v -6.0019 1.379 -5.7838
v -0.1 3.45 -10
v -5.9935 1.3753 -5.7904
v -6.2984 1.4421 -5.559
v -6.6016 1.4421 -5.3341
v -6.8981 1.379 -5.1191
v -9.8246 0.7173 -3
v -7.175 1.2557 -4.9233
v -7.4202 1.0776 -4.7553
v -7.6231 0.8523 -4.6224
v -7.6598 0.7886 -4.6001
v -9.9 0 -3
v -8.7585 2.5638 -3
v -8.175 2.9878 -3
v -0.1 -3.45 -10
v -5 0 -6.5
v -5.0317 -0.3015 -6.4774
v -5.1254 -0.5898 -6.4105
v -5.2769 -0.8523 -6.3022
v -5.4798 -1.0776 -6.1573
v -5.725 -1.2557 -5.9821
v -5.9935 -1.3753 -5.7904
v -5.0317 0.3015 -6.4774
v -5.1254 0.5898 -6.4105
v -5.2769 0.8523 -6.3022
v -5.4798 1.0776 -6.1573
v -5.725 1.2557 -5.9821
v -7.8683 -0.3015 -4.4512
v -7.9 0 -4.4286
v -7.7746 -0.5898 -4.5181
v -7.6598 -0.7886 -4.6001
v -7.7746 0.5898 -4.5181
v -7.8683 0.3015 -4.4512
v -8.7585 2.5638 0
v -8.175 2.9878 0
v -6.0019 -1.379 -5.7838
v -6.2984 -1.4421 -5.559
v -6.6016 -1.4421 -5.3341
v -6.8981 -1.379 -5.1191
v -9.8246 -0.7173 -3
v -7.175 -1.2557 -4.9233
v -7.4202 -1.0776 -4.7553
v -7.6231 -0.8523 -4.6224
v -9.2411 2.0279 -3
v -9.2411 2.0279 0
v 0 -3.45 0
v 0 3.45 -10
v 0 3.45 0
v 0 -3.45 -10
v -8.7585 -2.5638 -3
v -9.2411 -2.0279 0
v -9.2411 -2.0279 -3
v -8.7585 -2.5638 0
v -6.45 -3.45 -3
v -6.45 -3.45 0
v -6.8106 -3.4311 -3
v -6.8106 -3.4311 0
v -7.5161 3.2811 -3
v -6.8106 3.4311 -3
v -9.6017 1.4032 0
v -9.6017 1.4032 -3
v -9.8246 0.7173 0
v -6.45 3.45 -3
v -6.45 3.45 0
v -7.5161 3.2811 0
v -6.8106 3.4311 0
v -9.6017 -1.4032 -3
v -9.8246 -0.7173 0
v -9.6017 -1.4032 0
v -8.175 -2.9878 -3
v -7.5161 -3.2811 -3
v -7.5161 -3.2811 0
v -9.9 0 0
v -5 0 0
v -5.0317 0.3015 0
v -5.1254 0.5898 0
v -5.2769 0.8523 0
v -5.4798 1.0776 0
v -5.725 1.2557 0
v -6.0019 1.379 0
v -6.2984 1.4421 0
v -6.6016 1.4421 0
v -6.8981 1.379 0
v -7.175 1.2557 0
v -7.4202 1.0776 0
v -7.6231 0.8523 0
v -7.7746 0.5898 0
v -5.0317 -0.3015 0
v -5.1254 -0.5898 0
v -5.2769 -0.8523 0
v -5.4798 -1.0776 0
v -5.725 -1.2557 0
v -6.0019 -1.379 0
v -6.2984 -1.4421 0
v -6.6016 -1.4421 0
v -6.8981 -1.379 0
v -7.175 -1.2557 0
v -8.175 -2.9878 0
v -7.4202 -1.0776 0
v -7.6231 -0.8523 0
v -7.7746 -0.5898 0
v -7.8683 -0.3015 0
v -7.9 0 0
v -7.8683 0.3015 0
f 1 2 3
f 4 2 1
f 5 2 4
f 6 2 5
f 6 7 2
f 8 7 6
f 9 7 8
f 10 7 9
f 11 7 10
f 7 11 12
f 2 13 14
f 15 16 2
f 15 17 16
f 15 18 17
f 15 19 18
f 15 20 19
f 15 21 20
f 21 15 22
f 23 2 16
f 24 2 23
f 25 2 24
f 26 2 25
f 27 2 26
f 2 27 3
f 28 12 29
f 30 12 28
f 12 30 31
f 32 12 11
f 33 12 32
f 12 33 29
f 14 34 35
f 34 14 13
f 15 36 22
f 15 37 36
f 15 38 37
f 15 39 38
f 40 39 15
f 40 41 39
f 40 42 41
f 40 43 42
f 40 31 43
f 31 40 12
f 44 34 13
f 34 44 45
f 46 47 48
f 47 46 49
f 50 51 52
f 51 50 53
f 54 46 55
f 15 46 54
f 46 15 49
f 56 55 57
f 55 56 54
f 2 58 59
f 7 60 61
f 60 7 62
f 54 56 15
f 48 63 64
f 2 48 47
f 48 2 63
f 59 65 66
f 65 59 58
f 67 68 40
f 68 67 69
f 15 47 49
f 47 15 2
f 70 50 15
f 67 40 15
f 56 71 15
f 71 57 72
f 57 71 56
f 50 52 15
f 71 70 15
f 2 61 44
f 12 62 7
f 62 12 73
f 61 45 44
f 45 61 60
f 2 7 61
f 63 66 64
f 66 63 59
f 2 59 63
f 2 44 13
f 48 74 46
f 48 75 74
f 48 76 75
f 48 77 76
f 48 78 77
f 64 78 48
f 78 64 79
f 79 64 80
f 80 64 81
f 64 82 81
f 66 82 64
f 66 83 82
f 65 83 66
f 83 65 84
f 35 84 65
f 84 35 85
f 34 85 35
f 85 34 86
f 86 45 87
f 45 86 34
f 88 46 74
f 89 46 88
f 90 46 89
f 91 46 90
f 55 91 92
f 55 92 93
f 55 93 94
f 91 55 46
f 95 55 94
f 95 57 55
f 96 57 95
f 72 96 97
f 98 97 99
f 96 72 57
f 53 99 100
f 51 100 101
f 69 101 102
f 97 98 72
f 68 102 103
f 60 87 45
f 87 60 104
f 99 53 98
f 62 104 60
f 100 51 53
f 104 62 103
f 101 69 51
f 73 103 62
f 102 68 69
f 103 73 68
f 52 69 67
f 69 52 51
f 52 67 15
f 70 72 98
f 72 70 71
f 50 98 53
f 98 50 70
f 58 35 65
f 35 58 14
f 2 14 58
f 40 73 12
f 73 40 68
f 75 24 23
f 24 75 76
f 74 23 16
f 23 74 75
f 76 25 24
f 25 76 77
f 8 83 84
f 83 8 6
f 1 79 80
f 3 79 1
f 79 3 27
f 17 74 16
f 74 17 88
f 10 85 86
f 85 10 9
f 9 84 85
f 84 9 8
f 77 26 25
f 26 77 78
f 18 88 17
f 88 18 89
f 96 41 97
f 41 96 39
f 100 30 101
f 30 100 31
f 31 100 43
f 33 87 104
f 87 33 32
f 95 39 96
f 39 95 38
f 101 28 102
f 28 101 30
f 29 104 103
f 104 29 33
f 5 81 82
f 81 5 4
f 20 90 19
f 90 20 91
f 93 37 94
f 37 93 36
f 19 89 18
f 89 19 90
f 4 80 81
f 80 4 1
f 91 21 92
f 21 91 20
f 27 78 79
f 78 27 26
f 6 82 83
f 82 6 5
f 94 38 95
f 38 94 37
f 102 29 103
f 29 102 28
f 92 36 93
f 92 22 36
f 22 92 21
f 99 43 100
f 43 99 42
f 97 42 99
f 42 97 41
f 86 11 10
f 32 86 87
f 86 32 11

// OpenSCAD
module bolt_hole_cone(
    base_height=3,
    hole_d=2.9,
    wall = 2,
    wall_extra = 3,
    height_extra = 7,
    border = 0.1
) {

  out_d = hole_d + wall * 2;
  
  translate([-out_d/2 - wall_extra, 0, -base_height]) {
    difference() {
      hull() {
        cylinder(d=out_d, h=base_height);
        translate([0, -out_d/2, 0]) {
          cube([out_d/2 + wall_extra, out_d, base_height]);
        }
        translate([out_d/2 + wall_extra-border, -out_d/2, -height_extra]) {
          cube([border, out_d, 1]);
        }
      }
      translate([0, 0, -height_extra]) {
        cylinder(d=hole_d, h=base_height+height_extra);
      }
    }
  }
  
}

$fn = 30;
bolt_hole_cone();
